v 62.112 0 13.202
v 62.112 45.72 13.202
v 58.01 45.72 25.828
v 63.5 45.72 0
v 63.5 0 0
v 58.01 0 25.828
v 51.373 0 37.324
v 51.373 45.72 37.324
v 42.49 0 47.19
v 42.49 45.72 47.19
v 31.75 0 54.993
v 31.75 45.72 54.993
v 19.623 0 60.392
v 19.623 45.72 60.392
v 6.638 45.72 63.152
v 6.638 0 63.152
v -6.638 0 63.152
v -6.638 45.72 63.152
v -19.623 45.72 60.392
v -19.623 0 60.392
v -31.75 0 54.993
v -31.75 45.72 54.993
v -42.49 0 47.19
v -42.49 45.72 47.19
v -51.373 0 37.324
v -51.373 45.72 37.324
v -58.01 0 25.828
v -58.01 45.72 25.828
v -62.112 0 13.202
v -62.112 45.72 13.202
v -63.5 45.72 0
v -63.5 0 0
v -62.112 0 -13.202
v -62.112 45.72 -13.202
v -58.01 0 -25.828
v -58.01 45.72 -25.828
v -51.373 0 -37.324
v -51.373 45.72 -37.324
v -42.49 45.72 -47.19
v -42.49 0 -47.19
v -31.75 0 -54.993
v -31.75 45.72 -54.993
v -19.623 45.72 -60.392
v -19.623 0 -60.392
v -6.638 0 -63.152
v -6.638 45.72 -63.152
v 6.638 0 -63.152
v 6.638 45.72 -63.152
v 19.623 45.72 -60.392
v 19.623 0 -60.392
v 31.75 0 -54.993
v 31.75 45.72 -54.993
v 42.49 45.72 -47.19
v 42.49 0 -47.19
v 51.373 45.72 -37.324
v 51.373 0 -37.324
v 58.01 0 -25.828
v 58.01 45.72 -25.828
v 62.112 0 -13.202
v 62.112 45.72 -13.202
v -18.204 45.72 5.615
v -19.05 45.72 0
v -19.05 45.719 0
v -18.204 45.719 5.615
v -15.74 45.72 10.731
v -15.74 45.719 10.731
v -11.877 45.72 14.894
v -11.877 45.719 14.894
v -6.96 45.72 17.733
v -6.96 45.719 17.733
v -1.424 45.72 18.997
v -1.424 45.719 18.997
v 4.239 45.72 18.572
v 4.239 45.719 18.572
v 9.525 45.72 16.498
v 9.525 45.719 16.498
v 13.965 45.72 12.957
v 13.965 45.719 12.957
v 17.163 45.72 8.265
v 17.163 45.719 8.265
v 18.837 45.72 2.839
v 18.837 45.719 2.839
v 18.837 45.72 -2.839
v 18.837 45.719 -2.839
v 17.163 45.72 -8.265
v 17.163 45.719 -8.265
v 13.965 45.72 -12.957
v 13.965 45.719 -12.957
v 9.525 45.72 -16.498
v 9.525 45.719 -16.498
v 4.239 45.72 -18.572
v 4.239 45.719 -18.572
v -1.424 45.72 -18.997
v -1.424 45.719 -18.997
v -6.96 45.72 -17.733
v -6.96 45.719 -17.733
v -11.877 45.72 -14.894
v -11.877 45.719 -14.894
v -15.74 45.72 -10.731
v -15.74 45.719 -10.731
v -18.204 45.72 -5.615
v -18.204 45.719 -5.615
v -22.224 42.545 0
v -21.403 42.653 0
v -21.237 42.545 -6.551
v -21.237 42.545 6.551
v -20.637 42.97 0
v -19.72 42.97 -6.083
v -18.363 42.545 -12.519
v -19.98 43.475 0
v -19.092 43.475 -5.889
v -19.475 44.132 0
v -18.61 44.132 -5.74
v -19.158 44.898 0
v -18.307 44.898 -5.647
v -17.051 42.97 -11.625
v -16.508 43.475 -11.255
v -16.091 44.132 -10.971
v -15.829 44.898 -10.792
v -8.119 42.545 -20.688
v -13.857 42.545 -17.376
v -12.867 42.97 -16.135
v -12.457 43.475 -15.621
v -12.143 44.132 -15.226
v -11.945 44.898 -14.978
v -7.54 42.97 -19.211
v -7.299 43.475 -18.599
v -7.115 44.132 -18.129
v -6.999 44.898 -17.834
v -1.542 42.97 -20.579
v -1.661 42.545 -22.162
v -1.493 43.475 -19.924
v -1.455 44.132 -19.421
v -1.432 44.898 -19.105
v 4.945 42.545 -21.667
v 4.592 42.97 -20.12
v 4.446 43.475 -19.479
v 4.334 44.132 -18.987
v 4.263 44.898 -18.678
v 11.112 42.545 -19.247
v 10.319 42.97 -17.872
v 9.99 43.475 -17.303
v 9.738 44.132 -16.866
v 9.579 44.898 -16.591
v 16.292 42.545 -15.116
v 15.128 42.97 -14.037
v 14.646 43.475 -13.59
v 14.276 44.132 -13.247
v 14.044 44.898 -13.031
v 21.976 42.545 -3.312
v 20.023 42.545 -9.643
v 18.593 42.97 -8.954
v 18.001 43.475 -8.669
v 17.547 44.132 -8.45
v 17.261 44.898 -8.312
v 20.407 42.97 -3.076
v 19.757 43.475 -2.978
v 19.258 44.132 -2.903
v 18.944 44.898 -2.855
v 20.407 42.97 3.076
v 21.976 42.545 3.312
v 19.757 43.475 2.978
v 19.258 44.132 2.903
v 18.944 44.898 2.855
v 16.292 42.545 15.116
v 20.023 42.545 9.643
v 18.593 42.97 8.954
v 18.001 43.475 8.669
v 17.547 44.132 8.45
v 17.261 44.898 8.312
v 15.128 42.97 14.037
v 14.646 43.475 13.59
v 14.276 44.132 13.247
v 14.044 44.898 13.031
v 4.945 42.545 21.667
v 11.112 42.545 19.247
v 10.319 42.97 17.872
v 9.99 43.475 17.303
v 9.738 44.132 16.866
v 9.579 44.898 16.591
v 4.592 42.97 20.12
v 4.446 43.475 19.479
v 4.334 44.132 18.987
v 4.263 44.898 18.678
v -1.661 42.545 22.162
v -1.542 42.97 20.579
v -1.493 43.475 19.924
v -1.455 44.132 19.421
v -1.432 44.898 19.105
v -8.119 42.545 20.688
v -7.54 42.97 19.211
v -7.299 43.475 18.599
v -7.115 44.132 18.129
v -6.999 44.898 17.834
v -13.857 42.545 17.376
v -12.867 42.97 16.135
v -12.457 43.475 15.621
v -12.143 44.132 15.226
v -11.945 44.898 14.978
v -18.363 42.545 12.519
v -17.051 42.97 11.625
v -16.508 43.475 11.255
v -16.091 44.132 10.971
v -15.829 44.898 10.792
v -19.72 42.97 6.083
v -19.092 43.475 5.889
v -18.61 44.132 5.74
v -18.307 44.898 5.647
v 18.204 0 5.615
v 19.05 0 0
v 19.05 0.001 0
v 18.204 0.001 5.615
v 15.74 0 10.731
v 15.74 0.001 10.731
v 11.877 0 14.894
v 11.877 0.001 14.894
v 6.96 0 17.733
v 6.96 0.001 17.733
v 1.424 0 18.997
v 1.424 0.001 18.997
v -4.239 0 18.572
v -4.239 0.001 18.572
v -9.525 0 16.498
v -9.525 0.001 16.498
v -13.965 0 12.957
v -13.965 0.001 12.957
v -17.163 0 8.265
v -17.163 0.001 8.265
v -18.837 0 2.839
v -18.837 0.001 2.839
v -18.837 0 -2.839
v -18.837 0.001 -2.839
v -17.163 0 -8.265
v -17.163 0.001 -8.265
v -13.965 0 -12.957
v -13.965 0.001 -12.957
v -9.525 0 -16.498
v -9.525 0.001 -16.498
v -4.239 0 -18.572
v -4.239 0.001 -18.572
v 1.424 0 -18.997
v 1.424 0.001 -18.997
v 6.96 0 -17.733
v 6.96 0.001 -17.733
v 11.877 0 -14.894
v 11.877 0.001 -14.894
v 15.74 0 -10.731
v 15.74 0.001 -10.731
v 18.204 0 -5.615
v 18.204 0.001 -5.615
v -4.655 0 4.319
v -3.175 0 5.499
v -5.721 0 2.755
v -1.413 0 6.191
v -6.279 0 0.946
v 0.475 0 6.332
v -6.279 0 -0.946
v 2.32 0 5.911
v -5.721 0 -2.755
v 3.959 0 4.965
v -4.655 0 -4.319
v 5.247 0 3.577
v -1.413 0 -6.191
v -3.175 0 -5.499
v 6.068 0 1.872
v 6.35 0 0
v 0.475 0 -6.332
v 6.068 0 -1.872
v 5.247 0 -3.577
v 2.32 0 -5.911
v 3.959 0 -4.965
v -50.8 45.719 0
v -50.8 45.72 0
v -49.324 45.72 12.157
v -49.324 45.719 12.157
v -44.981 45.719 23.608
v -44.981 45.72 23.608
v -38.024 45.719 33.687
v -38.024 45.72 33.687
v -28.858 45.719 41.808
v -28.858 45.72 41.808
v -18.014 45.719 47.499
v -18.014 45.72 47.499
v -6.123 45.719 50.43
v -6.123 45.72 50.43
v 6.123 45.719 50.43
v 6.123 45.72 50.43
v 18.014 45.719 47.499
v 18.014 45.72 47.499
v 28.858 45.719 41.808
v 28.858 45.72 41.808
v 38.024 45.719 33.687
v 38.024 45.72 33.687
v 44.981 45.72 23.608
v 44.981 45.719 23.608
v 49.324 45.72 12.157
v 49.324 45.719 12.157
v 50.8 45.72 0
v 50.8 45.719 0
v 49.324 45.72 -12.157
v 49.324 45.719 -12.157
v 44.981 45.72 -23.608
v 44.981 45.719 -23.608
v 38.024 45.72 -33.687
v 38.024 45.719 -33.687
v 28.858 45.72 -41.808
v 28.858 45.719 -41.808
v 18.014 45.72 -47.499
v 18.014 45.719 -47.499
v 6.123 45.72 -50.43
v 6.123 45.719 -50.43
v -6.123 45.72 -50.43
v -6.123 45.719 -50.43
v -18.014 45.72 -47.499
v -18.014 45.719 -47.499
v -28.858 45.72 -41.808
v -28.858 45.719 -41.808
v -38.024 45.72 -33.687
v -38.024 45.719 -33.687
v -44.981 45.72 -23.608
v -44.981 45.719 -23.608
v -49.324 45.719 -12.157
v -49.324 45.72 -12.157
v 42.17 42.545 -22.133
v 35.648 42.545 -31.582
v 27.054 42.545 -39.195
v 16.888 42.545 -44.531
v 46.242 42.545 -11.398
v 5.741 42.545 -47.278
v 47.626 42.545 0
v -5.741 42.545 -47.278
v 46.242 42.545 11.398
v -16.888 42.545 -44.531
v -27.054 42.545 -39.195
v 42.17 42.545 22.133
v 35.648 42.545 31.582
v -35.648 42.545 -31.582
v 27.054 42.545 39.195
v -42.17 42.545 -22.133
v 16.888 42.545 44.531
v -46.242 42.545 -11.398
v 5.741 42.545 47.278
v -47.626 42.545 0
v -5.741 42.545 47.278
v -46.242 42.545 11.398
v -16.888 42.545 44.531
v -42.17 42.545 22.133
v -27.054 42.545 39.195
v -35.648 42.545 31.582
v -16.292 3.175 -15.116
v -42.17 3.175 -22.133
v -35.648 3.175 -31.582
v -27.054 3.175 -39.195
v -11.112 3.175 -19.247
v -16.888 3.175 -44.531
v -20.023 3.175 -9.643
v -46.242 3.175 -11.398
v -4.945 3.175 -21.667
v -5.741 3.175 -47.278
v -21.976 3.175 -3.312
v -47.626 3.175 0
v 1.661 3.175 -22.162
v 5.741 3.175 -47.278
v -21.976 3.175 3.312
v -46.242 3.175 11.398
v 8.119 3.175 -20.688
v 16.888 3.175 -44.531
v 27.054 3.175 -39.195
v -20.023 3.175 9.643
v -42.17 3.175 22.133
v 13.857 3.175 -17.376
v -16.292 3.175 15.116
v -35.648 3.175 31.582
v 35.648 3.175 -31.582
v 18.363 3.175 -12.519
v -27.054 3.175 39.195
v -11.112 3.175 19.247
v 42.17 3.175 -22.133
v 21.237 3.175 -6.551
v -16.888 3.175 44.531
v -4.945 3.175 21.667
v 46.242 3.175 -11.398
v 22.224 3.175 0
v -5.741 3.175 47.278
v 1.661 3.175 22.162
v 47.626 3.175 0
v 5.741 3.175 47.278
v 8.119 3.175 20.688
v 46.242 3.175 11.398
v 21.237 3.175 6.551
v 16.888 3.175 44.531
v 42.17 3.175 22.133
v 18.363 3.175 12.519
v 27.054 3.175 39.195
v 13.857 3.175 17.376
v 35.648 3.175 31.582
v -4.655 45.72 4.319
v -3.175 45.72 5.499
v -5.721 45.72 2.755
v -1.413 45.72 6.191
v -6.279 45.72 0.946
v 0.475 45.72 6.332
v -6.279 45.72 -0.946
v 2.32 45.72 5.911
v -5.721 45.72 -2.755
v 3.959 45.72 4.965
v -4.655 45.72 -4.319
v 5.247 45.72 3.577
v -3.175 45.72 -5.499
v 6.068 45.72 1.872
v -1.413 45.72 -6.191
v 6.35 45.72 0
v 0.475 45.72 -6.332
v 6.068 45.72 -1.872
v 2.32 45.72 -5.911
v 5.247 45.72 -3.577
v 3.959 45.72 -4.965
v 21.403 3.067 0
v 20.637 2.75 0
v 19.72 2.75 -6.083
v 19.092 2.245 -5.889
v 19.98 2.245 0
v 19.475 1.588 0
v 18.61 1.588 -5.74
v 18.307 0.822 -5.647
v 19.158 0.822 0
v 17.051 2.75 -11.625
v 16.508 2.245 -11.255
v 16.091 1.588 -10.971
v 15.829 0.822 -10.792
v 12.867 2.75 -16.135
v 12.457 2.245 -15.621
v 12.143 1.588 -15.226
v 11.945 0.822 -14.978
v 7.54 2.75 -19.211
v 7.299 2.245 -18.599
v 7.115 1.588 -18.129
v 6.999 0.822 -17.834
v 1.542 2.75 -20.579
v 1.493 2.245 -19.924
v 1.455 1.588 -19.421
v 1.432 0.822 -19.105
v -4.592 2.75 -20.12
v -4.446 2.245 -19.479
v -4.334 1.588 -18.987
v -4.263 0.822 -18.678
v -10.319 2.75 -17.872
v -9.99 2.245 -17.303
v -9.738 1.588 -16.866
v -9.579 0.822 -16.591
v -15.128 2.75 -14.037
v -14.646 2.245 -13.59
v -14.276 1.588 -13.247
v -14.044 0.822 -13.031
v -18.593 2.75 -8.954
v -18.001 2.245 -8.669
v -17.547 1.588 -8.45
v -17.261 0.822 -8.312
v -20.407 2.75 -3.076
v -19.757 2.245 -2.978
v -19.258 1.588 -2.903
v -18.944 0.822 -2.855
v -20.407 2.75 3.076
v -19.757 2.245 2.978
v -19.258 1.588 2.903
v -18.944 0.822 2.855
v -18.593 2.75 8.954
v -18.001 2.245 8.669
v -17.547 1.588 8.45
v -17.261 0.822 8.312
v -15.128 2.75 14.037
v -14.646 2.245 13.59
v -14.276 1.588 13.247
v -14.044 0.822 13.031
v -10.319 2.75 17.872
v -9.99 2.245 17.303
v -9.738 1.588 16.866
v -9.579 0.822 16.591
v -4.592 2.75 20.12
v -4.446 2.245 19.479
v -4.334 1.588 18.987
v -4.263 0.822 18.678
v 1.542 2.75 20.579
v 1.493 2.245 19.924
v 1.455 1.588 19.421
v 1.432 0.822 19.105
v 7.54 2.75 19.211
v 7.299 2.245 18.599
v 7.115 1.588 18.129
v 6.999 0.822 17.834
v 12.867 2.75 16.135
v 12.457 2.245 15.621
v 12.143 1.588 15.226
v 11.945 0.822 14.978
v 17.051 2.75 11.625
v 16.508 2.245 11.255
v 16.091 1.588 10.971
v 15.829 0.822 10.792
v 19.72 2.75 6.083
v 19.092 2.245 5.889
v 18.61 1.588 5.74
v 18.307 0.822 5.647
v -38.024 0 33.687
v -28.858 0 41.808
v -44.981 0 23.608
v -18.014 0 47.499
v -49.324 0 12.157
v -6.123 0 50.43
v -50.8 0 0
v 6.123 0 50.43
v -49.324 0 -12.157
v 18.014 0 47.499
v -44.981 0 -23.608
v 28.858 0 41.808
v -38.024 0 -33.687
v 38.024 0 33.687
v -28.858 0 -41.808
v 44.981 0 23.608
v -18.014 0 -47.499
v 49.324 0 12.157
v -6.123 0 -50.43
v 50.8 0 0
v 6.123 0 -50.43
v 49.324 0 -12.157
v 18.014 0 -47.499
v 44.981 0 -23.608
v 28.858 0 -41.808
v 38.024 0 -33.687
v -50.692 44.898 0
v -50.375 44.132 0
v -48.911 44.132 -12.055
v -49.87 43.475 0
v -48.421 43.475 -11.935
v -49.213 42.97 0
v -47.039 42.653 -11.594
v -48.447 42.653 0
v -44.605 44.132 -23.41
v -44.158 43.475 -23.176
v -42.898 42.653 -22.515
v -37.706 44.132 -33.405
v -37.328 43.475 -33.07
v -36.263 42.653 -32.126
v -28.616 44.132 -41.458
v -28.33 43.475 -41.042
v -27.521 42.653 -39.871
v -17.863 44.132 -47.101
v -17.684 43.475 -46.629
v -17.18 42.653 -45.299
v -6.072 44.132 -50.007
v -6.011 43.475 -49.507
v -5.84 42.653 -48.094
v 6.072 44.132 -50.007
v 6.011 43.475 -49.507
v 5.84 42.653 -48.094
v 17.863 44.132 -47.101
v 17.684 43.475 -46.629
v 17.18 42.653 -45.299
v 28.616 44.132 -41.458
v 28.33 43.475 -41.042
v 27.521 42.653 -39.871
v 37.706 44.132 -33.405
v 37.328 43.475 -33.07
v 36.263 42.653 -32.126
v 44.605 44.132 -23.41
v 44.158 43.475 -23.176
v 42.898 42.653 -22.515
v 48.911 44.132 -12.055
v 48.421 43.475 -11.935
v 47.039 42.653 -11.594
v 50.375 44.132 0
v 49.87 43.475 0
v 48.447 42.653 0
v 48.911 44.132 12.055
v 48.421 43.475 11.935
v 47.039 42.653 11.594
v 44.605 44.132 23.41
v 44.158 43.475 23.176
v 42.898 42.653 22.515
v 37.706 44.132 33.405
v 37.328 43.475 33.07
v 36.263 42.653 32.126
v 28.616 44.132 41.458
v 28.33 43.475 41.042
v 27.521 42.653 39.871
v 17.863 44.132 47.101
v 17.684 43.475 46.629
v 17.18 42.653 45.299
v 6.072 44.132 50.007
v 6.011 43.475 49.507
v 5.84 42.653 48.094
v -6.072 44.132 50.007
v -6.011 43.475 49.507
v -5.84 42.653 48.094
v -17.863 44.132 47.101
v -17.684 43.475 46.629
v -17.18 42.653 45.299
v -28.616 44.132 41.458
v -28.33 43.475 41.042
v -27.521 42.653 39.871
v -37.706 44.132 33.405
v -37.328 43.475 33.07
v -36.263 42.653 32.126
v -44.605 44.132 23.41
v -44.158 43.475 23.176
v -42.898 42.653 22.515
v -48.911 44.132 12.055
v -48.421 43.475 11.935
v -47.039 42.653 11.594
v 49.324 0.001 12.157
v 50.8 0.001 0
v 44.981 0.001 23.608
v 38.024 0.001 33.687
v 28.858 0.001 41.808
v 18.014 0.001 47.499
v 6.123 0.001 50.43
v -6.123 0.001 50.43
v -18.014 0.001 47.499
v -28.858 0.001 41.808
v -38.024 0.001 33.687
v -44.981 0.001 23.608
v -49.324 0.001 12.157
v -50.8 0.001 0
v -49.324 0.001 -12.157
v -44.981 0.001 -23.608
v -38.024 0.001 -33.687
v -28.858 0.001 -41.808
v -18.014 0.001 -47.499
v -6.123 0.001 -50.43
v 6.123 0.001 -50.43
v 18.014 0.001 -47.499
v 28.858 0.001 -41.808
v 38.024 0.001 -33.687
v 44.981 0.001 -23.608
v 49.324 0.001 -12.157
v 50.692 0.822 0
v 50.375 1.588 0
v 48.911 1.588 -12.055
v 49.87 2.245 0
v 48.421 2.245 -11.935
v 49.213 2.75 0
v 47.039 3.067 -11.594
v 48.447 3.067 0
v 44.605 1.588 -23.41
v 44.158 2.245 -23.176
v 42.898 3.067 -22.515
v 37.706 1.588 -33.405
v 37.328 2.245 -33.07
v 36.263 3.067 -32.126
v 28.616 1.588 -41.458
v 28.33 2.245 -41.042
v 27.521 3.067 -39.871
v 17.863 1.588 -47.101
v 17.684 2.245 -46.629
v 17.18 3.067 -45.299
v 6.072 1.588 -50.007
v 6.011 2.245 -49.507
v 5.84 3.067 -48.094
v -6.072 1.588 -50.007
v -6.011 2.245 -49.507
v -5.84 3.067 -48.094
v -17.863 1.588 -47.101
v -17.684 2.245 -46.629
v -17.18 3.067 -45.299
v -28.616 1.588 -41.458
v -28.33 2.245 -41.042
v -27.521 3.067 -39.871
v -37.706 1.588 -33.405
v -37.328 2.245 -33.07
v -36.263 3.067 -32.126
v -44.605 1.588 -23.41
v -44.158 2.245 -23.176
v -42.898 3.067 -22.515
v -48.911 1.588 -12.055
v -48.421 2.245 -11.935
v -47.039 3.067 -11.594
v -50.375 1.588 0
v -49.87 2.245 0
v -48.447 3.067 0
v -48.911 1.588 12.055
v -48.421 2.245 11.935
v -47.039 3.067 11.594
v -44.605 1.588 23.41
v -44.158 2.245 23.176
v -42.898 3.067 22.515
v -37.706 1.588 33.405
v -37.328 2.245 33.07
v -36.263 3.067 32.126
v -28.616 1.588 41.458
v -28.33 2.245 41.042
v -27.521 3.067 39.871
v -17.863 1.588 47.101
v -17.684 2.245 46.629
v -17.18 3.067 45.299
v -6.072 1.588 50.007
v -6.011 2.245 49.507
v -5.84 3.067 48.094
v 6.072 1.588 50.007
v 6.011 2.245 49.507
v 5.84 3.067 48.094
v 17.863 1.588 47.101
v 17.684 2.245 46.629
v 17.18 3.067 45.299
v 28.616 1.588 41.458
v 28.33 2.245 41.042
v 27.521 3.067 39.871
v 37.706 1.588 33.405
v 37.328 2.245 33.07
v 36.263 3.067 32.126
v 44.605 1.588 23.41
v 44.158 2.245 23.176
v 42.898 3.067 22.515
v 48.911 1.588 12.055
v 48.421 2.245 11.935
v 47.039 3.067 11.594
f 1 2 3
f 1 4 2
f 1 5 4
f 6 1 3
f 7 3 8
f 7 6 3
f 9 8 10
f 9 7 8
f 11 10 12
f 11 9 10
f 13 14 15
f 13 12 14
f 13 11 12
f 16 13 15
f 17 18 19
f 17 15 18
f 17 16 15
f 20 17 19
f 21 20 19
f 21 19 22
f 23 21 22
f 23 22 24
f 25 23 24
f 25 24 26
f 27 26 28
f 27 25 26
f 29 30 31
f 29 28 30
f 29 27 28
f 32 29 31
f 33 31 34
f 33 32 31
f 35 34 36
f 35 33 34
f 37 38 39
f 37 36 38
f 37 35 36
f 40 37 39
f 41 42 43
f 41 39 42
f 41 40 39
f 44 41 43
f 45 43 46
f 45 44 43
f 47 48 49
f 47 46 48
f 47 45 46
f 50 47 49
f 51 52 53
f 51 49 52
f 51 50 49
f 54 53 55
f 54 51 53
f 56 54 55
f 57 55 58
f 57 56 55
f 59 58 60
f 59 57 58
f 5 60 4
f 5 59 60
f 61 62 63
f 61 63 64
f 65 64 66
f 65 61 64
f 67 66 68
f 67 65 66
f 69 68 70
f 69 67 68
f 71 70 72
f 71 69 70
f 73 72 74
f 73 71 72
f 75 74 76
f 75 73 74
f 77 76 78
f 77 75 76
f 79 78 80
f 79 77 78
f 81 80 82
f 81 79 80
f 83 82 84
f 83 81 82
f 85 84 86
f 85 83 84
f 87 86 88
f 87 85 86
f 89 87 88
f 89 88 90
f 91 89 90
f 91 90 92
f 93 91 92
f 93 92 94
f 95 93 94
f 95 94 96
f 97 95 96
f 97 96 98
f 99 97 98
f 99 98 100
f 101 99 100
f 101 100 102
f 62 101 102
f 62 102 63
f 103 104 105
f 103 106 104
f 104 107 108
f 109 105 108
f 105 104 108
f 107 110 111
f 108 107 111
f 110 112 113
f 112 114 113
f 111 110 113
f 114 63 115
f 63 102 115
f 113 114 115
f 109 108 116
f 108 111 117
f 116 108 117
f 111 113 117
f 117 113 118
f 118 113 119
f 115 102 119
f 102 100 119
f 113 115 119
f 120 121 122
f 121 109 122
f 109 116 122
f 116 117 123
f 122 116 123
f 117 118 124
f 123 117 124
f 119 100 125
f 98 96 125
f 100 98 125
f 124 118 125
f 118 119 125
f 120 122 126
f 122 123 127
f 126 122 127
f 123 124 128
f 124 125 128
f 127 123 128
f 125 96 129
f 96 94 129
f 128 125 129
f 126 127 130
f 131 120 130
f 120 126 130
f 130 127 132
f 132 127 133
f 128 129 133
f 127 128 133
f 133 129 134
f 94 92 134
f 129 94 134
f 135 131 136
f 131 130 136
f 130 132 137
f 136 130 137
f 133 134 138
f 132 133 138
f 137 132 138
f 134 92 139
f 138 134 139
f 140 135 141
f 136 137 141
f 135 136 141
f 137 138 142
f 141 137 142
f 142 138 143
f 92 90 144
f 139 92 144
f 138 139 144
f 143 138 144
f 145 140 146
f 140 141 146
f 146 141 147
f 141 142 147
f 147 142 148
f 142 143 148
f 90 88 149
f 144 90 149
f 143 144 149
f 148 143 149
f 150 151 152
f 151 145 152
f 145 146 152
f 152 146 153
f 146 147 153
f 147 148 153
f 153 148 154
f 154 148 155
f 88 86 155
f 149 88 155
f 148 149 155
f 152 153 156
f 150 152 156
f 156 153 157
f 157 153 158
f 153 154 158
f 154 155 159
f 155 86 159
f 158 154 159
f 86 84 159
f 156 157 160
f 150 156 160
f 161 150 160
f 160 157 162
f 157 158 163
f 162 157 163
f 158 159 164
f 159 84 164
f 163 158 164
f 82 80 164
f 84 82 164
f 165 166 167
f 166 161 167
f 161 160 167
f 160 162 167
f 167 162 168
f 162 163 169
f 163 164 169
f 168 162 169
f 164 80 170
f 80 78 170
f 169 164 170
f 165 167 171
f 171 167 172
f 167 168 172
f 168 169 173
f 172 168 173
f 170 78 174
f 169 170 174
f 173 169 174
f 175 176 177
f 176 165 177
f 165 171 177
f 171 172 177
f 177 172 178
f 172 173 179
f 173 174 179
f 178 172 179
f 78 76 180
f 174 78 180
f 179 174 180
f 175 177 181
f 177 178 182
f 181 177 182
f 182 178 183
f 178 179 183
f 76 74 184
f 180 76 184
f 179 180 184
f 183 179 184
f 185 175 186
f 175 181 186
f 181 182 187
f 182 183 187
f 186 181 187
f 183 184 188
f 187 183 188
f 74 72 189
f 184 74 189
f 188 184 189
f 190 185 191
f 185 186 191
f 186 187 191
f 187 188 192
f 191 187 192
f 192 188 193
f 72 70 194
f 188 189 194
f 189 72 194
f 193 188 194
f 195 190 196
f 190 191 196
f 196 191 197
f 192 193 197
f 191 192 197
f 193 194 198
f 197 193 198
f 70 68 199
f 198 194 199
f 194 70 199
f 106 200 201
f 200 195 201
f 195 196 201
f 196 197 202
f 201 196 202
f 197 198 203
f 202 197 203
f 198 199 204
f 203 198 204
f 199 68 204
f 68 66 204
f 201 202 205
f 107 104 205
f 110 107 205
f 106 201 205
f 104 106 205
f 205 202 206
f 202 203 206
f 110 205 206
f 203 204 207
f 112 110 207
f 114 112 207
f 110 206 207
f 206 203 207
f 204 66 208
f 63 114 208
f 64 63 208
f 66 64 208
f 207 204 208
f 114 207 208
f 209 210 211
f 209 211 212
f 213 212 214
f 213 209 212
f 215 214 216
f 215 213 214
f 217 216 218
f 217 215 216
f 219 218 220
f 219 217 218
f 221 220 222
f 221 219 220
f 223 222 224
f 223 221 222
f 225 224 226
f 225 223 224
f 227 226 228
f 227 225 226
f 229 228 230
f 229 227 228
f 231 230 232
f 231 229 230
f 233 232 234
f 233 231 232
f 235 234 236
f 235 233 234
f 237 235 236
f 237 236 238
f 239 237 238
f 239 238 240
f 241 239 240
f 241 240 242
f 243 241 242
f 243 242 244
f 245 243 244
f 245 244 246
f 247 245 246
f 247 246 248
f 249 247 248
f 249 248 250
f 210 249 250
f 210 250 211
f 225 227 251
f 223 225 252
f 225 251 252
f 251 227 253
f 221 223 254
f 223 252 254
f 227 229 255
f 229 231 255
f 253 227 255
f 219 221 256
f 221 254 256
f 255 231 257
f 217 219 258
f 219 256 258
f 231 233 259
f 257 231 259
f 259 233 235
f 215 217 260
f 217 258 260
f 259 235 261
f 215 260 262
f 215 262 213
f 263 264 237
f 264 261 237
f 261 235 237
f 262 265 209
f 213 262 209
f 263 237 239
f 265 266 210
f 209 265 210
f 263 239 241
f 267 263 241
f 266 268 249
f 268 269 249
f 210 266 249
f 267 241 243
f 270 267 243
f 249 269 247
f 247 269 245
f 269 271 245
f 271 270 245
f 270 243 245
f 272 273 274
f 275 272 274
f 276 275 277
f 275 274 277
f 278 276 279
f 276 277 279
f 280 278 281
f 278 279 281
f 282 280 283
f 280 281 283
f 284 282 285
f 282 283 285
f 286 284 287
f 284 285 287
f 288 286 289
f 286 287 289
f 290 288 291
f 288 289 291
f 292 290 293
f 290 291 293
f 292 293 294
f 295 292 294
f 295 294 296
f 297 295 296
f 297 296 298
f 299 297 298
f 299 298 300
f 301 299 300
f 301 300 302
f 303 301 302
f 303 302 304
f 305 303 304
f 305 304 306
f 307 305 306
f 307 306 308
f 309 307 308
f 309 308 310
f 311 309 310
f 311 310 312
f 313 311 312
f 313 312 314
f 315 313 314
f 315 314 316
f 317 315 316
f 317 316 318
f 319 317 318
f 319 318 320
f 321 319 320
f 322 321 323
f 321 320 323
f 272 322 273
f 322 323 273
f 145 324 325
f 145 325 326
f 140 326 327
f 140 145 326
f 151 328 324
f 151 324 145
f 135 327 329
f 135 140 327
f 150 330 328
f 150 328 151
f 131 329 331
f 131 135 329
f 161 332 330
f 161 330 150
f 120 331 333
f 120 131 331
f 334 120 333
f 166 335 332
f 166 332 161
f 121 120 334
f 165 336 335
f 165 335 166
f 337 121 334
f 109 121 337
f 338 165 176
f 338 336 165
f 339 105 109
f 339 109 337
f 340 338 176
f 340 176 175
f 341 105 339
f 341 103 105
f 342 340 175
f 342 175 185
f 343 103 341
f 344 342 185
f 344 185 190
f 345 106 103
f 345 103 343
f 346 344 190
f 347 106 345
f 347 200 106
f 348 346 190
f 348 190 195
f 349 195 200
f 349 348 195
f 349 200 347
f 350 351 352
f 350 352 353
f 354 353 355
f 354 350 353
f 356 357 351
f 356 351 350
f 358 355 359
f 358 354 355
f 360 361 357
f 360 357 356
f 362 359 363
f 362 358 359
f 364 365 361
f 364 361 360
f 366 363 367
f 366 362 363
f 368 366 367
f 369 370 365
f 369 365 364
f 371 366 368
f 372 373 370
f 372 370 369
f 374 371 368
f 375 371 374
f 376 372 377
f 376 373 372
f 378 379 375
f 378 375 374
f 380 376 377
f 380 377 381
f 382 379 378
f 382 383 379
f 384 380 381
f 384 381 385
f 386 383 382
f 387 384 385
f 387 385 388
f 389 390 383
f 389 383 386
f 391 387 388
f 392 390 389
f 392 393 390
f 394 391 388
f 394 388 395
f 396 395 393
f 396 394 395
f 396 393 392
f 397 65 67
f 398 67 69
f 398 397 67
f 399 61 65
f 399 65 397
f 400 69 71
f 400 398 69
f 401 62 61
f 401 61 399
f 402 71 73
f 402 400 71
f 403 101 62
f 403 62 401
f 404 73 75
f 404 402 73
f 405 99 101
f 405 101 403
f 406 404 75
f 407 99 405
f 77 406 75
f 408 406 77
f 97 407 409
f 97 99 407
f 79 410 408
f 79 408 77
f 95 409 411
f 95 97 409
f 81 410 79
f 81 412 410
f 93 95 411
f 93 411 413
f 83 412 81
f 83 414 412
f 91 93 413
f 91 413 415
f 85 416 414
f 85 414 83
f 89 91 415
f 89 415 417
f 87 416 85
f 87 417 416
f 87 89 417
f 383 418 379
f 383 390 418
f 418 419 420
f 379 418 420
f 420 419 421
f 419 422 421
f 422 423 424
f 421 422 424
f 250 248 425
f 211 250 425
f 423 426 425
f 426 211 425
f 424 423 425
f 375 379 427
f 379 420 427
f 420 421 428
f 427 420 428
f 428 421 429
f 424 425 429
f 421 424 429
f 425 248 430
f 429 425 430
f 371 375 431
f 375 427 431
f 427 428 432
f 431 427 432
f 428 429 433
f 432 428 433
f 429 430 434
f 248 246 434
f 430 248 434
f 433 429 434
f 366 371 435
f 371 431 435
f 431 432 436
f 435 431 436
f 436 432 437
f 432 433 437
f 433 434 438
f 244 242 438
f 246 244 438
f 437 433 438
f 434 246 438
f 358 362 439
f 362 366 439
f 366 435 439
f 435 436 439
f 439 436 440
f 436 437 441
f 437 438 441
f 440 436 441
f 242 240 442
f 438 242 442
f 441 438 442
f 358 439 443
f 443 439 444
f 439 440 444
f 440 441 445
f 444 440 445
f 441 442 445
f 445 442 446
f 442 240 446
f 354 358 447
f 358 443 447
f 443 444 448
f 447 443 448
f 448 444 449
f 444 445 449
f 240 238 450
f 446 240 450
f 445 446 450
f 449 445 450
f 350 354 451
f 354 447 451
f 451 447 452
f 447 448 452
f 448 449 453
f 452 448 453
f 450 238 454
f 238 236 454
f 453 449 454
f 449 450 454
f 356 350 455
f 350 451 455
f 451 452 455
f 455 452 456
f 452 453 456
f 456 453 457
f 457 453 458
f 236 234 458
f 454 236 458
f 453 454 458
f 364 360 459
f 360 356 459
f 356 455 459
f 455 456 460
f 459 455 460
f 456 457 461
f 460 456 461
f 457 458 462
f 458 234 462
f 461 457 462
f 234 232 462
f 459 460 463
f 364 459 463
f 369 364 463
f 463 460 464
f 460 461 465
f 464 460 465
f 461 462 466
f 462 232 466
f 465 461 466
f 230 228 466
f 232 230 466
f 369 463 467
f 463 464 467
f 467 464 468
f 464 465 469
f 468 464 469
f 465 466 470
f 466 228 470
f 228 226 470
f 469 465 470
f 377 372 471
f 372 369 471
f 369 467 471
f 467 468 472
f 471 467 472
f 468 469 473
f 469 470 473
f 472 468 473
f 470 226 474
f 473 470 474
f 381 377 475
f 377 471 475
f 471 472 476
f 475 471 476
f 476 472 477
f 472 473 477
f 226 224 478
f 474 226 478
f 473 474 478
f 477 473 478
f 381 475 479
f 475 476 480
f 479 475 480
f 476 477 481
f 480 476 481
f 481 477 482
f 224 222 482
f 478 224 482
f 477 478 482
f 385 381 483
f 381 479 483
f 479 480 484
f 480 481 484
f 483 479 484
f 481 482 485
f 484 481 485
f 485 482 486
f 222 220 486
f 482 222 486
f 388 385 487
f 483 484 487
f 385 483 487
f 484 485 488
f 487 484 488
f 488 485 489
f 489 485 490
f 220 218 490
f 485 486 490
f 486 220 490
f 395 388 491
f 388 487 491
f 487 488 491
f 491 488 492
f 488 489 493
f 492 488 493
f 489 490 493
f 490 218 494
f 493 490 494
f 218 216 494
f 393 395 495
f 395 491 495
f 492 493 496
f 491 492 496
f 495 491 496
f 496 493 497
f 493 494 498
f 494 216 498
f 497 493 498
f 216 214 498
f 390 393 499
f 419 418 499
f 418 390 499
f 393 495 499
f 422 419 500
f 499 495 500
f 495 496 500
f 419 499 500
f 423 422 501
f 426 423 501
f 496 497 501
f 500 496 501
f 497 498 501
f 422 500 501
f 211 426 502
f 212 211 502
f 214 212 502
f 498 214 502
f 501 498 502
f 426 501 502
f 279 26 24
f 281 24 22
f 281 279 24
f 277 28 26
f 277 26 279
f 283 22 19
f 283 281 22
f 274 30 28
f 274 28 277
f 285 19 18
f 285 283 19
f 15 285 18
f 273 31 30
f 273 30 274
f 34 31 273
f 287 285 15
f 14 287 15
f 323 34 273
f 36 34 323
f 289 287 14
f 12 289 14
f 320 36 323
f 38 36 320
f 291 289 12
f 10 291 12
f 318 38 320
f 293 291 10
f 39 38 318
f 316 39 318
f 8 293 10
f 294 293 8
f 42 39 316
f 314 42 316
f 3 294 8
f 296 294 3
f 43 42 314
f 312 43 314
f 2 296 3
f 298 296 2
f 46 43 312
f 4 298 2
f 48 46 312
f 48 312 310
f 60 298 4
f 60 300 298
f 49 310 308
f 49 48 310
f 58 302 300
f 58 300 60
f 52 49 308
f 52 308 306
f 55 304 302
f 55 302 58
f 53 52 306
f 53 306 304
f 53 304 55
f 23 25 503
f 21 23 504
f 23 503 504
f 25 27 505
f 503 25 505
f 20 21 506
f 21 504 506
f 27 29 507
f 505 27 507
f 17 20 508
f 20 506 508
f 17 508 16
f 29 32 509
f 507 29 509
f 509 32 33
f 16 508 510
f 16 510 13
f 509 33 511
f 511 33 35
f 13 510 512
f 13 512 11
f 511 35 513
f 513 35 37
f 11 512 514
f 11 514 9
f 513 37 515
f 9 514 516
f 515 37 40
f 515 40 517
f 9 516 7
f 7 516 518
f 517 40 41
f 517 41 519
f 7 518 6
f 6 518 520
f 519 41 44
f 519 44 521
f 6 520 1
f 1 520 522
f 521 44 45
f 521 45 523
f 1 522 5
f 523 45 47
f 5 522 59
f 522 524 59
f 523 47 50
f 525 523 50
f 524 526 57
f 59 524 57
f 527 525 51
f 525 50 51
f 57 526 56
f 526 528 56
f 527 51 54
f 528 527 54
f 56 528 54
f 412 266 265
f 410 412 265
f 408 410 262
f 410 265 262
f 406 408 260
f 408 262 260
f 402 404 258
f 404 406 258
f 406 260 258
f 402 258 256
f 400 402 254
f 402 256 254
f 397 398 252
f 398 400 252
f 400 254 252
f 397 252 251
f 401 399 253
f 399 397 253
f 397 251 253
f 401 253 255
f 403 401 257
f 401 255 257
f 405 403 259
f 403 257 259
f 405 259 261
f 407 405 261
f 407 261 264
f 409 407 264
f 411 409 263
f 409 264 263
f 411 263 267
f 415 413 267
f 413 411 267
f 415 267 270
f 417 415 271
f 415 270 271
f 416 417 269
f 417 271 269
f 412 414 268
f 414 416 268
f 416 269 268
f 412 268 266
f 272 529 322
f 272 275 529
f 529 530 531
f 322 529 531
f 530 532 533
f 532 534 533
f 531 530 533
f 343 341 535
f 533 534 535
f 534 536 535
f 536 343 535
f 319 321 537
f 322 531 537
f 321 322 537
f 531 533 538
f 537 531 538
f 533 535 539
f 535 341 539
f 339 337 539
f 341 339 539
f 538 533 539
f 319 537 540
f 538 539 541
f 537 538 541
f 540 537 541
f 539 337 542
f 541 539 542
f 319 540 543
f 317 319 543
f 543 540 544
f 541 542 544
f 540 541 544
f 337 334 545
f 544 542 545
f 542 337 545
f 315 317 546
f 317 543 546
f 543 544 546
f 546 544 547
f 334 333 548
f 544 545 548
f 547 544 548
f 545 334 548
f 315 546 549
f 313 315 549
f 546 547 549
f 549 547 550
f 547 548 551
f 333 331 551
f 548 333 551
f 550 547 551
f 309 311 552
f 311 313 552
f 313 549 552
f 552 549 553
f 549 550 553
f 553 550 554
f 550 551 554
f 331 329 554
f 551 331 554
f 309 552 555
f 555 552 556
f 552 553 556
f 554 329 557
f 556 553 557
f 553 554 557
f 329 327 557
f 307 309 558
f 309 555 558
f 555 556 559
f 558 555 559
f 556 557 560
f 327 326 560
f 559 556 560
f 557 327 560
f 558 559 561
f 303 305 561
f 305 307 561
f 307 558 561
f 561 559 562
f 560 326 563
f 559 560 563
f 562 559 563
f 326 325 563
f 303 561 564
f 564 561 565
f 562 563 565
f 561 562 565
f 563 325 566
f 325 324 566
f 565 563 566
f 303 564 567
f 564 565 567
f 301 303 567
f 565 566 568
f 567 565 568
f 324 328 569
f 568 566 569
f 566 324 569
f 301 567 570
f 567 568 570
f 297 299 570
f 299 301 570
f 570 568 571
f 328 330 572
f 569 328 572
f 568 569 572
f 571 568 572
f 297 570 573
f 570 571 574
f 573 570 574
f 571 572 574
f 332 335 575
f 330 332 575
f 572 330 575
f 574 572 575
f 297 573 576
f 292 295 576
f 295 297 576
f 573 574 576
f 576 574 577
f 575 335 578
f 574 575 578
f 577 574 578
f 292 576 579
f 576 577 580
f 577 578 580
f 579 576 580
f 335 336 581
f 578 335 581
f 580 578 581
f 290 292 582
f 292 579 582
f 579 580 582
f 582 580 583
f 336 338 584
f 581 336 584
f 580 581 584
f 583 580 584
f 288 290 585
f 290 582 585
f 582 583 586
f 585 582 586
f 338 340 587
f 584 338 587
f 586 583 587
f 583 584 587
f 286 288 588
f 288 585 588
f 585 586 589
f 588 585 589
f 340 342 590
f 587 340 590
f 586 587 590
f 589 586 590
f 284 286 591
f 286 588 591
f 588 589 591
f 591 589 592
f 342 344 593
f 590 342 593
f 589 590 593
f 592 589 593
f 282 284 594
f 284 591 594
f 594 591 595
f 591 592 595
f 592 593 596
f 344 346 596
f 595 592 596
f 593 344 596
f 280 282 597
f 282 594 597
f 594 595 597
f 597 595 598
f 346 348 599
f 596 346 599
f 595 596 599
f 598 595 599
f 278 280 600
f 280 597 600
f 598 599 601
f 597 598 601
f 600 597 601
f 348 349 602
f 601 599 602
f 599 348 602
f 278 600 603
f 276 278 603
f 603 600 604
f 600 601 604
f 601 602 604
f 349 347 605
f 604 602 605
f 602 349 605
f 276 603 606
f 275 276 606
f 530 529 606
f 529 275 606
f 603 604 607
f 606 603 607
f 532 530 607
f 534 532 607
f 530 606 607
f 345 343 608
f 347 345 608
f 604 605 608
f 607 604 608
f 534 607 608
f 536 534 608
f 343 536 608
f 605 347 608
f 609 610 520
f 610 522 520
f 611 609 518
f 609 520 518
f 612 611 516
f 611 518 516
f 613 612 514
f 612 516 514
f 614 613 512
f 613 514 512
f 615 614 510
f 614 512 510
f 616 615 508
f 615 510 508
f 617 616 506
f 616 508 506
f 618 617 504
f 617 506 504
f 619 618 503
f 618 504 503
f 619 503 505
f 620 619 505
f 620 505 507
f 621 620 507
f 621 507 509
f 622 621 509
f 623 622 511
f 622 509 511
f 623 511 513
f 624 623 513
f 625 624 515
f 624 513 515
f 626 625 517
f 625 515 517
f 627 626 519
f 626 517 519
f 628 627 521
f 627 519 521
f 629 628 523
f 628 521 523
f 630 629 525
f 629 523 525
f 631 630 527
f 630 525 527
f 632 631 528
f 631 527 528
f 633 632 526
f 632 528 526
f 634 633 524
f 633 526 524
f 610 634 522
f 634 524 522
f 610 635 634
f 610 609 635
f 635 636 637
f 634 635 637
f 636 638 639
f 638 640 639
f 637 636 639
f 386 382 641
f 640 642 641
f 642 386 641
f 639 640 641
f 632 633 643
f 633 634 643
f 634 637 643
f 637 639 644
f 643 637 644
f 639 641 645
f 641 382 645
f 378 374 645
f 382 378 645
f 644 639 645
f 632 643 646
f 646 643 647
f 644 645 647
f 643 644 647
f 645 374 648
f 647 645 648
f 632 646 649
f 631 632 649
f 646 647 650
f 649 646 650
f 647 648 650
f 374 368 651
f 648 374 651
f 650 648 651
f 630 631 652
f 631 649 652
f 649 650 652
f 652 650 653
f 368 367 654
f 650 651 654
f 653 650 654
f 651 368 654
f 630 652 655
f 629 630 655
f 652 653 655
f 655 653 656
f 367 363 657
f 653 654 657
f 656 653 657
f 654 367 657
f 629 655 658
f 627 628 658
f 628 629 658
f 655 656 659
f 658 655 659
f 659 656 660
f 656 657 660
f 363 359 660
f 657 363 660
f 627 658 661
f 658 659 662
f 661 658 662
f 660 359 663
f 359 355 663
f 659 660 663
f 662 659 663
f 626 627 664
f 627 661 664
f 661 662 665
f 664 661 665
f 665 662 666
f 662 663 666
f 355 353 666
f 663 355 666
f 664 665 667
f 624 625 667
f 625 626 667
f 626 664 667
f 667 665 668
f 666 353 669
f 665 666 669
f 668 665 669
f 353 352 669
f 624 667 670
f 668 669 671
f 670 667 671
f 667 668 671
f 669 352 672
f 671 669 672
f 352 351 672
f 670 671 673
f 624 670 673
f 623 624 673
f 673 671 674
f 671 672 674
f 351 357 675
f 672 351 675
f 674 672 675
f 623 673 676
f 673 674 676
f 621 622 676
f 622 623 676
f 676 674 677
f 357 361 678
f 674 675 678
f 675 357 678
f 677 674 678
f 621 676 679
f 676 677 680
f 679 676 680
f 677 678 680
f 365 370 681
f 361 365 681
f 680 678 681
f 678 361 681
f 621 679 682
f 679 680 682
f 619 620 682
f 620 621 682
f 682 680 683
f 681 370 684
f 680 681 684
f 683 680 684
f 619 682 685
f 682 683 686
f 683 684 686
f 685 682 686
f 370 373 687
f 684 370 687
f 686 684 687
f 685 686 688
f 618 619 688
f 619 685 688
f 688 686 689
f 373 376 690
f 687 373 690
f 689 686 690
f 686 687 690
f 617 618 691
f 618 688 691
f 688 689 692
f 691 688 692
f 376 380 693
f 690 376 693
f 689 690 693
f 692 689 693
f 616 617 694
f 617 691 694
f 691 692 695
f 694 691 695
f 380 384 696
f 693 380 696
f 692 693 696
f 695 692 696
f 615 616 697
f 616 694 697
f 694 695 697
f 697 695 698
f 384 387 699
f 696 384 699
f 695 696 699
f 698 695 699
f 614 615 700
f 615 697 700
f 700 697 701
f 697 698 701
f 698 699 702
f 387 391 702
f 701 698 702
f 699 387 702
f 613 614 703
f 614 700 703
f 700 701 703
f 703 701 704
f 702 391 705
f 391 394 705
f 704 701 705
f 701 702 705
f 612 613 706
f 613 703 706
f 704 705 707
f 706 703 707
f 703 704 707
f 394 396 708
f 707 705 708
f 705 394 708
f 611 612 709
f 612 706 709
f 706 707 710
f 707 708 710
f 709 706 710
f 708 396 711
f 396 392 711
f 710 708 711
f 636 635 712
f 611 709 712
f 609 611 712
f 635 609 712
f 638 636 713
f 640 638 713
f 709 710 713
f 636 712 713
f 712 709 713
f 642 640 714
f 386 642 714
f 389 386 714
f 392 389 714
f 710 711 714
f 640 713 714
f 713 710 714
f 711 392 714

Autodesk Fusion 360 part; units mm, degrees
sketch "Sketch1" plane through (0, 0, 0) normal (0, 1, 0) x (1, 0, 0)
  circle A0 centre (0, 0) radius 63.5
  circle A1 centre (0, 0) radius 6.35
extrude "Extrude1" add sketch "Sketch1" along normal blind 45.72 makes body 1
sketch "Sketch2" plane through (0, 0, 0) normal (0, -1, 0) x (1, 0, 0)
  circle A0 centre (0, 0) radius 6.35
  circle A1 centre (0, 0) radius 63.5
  circle A2 centre (0, 0) radius 50.8
  circle A3 centre (0, 0) radius 19.05
  dimension "d5" = 101.6
  dimension "d6" = 38.1
extrude "Extrude2" cut sketch "Sketch2" against normal blind 3.175 contours A2 bodies 1
sketch "Sketch3" plane through (0, 45.72, 0) normal (0, 1, 0) x (-1, 0, 0)
  circle A0 centre (0, 0) radius 6.35
  circle A1 centre (0, 0) radius 63.5
  circle A2 centre (0, 0) radius 50.8
  circle A3 centre (0, 0) radius 19.05
  dimension "d9" = 101.6
  dimension "d10" = 38.1
extrude "Extrude3" cut sketch "Sketch3" against normal blind 3.175 contours A2 bodies 1
fillet "Fillet1" radius 3.175 2 edges at (17.7608, 42.545, -6.8888) (47.3622, 42.545, 18.3701) on bodies 1
fillet "Fillet2" radius 3.175 2 edges at (-17.7608, 3.175, -6.8888) (-47.3622, 3.175, 18.3701) on bodies 1
copy_body "Body->Comp1" bodies 1 removing the originals makes body 2 in component "Rolling Wheel"
component "Rolling Wheel" placed x (1, 0, 0) y (0, 1, 0) z (0, 0, 1) at (0, 0, 0)
equation "d7 = ( -1 / 4 / 2 ) * 1 in"
